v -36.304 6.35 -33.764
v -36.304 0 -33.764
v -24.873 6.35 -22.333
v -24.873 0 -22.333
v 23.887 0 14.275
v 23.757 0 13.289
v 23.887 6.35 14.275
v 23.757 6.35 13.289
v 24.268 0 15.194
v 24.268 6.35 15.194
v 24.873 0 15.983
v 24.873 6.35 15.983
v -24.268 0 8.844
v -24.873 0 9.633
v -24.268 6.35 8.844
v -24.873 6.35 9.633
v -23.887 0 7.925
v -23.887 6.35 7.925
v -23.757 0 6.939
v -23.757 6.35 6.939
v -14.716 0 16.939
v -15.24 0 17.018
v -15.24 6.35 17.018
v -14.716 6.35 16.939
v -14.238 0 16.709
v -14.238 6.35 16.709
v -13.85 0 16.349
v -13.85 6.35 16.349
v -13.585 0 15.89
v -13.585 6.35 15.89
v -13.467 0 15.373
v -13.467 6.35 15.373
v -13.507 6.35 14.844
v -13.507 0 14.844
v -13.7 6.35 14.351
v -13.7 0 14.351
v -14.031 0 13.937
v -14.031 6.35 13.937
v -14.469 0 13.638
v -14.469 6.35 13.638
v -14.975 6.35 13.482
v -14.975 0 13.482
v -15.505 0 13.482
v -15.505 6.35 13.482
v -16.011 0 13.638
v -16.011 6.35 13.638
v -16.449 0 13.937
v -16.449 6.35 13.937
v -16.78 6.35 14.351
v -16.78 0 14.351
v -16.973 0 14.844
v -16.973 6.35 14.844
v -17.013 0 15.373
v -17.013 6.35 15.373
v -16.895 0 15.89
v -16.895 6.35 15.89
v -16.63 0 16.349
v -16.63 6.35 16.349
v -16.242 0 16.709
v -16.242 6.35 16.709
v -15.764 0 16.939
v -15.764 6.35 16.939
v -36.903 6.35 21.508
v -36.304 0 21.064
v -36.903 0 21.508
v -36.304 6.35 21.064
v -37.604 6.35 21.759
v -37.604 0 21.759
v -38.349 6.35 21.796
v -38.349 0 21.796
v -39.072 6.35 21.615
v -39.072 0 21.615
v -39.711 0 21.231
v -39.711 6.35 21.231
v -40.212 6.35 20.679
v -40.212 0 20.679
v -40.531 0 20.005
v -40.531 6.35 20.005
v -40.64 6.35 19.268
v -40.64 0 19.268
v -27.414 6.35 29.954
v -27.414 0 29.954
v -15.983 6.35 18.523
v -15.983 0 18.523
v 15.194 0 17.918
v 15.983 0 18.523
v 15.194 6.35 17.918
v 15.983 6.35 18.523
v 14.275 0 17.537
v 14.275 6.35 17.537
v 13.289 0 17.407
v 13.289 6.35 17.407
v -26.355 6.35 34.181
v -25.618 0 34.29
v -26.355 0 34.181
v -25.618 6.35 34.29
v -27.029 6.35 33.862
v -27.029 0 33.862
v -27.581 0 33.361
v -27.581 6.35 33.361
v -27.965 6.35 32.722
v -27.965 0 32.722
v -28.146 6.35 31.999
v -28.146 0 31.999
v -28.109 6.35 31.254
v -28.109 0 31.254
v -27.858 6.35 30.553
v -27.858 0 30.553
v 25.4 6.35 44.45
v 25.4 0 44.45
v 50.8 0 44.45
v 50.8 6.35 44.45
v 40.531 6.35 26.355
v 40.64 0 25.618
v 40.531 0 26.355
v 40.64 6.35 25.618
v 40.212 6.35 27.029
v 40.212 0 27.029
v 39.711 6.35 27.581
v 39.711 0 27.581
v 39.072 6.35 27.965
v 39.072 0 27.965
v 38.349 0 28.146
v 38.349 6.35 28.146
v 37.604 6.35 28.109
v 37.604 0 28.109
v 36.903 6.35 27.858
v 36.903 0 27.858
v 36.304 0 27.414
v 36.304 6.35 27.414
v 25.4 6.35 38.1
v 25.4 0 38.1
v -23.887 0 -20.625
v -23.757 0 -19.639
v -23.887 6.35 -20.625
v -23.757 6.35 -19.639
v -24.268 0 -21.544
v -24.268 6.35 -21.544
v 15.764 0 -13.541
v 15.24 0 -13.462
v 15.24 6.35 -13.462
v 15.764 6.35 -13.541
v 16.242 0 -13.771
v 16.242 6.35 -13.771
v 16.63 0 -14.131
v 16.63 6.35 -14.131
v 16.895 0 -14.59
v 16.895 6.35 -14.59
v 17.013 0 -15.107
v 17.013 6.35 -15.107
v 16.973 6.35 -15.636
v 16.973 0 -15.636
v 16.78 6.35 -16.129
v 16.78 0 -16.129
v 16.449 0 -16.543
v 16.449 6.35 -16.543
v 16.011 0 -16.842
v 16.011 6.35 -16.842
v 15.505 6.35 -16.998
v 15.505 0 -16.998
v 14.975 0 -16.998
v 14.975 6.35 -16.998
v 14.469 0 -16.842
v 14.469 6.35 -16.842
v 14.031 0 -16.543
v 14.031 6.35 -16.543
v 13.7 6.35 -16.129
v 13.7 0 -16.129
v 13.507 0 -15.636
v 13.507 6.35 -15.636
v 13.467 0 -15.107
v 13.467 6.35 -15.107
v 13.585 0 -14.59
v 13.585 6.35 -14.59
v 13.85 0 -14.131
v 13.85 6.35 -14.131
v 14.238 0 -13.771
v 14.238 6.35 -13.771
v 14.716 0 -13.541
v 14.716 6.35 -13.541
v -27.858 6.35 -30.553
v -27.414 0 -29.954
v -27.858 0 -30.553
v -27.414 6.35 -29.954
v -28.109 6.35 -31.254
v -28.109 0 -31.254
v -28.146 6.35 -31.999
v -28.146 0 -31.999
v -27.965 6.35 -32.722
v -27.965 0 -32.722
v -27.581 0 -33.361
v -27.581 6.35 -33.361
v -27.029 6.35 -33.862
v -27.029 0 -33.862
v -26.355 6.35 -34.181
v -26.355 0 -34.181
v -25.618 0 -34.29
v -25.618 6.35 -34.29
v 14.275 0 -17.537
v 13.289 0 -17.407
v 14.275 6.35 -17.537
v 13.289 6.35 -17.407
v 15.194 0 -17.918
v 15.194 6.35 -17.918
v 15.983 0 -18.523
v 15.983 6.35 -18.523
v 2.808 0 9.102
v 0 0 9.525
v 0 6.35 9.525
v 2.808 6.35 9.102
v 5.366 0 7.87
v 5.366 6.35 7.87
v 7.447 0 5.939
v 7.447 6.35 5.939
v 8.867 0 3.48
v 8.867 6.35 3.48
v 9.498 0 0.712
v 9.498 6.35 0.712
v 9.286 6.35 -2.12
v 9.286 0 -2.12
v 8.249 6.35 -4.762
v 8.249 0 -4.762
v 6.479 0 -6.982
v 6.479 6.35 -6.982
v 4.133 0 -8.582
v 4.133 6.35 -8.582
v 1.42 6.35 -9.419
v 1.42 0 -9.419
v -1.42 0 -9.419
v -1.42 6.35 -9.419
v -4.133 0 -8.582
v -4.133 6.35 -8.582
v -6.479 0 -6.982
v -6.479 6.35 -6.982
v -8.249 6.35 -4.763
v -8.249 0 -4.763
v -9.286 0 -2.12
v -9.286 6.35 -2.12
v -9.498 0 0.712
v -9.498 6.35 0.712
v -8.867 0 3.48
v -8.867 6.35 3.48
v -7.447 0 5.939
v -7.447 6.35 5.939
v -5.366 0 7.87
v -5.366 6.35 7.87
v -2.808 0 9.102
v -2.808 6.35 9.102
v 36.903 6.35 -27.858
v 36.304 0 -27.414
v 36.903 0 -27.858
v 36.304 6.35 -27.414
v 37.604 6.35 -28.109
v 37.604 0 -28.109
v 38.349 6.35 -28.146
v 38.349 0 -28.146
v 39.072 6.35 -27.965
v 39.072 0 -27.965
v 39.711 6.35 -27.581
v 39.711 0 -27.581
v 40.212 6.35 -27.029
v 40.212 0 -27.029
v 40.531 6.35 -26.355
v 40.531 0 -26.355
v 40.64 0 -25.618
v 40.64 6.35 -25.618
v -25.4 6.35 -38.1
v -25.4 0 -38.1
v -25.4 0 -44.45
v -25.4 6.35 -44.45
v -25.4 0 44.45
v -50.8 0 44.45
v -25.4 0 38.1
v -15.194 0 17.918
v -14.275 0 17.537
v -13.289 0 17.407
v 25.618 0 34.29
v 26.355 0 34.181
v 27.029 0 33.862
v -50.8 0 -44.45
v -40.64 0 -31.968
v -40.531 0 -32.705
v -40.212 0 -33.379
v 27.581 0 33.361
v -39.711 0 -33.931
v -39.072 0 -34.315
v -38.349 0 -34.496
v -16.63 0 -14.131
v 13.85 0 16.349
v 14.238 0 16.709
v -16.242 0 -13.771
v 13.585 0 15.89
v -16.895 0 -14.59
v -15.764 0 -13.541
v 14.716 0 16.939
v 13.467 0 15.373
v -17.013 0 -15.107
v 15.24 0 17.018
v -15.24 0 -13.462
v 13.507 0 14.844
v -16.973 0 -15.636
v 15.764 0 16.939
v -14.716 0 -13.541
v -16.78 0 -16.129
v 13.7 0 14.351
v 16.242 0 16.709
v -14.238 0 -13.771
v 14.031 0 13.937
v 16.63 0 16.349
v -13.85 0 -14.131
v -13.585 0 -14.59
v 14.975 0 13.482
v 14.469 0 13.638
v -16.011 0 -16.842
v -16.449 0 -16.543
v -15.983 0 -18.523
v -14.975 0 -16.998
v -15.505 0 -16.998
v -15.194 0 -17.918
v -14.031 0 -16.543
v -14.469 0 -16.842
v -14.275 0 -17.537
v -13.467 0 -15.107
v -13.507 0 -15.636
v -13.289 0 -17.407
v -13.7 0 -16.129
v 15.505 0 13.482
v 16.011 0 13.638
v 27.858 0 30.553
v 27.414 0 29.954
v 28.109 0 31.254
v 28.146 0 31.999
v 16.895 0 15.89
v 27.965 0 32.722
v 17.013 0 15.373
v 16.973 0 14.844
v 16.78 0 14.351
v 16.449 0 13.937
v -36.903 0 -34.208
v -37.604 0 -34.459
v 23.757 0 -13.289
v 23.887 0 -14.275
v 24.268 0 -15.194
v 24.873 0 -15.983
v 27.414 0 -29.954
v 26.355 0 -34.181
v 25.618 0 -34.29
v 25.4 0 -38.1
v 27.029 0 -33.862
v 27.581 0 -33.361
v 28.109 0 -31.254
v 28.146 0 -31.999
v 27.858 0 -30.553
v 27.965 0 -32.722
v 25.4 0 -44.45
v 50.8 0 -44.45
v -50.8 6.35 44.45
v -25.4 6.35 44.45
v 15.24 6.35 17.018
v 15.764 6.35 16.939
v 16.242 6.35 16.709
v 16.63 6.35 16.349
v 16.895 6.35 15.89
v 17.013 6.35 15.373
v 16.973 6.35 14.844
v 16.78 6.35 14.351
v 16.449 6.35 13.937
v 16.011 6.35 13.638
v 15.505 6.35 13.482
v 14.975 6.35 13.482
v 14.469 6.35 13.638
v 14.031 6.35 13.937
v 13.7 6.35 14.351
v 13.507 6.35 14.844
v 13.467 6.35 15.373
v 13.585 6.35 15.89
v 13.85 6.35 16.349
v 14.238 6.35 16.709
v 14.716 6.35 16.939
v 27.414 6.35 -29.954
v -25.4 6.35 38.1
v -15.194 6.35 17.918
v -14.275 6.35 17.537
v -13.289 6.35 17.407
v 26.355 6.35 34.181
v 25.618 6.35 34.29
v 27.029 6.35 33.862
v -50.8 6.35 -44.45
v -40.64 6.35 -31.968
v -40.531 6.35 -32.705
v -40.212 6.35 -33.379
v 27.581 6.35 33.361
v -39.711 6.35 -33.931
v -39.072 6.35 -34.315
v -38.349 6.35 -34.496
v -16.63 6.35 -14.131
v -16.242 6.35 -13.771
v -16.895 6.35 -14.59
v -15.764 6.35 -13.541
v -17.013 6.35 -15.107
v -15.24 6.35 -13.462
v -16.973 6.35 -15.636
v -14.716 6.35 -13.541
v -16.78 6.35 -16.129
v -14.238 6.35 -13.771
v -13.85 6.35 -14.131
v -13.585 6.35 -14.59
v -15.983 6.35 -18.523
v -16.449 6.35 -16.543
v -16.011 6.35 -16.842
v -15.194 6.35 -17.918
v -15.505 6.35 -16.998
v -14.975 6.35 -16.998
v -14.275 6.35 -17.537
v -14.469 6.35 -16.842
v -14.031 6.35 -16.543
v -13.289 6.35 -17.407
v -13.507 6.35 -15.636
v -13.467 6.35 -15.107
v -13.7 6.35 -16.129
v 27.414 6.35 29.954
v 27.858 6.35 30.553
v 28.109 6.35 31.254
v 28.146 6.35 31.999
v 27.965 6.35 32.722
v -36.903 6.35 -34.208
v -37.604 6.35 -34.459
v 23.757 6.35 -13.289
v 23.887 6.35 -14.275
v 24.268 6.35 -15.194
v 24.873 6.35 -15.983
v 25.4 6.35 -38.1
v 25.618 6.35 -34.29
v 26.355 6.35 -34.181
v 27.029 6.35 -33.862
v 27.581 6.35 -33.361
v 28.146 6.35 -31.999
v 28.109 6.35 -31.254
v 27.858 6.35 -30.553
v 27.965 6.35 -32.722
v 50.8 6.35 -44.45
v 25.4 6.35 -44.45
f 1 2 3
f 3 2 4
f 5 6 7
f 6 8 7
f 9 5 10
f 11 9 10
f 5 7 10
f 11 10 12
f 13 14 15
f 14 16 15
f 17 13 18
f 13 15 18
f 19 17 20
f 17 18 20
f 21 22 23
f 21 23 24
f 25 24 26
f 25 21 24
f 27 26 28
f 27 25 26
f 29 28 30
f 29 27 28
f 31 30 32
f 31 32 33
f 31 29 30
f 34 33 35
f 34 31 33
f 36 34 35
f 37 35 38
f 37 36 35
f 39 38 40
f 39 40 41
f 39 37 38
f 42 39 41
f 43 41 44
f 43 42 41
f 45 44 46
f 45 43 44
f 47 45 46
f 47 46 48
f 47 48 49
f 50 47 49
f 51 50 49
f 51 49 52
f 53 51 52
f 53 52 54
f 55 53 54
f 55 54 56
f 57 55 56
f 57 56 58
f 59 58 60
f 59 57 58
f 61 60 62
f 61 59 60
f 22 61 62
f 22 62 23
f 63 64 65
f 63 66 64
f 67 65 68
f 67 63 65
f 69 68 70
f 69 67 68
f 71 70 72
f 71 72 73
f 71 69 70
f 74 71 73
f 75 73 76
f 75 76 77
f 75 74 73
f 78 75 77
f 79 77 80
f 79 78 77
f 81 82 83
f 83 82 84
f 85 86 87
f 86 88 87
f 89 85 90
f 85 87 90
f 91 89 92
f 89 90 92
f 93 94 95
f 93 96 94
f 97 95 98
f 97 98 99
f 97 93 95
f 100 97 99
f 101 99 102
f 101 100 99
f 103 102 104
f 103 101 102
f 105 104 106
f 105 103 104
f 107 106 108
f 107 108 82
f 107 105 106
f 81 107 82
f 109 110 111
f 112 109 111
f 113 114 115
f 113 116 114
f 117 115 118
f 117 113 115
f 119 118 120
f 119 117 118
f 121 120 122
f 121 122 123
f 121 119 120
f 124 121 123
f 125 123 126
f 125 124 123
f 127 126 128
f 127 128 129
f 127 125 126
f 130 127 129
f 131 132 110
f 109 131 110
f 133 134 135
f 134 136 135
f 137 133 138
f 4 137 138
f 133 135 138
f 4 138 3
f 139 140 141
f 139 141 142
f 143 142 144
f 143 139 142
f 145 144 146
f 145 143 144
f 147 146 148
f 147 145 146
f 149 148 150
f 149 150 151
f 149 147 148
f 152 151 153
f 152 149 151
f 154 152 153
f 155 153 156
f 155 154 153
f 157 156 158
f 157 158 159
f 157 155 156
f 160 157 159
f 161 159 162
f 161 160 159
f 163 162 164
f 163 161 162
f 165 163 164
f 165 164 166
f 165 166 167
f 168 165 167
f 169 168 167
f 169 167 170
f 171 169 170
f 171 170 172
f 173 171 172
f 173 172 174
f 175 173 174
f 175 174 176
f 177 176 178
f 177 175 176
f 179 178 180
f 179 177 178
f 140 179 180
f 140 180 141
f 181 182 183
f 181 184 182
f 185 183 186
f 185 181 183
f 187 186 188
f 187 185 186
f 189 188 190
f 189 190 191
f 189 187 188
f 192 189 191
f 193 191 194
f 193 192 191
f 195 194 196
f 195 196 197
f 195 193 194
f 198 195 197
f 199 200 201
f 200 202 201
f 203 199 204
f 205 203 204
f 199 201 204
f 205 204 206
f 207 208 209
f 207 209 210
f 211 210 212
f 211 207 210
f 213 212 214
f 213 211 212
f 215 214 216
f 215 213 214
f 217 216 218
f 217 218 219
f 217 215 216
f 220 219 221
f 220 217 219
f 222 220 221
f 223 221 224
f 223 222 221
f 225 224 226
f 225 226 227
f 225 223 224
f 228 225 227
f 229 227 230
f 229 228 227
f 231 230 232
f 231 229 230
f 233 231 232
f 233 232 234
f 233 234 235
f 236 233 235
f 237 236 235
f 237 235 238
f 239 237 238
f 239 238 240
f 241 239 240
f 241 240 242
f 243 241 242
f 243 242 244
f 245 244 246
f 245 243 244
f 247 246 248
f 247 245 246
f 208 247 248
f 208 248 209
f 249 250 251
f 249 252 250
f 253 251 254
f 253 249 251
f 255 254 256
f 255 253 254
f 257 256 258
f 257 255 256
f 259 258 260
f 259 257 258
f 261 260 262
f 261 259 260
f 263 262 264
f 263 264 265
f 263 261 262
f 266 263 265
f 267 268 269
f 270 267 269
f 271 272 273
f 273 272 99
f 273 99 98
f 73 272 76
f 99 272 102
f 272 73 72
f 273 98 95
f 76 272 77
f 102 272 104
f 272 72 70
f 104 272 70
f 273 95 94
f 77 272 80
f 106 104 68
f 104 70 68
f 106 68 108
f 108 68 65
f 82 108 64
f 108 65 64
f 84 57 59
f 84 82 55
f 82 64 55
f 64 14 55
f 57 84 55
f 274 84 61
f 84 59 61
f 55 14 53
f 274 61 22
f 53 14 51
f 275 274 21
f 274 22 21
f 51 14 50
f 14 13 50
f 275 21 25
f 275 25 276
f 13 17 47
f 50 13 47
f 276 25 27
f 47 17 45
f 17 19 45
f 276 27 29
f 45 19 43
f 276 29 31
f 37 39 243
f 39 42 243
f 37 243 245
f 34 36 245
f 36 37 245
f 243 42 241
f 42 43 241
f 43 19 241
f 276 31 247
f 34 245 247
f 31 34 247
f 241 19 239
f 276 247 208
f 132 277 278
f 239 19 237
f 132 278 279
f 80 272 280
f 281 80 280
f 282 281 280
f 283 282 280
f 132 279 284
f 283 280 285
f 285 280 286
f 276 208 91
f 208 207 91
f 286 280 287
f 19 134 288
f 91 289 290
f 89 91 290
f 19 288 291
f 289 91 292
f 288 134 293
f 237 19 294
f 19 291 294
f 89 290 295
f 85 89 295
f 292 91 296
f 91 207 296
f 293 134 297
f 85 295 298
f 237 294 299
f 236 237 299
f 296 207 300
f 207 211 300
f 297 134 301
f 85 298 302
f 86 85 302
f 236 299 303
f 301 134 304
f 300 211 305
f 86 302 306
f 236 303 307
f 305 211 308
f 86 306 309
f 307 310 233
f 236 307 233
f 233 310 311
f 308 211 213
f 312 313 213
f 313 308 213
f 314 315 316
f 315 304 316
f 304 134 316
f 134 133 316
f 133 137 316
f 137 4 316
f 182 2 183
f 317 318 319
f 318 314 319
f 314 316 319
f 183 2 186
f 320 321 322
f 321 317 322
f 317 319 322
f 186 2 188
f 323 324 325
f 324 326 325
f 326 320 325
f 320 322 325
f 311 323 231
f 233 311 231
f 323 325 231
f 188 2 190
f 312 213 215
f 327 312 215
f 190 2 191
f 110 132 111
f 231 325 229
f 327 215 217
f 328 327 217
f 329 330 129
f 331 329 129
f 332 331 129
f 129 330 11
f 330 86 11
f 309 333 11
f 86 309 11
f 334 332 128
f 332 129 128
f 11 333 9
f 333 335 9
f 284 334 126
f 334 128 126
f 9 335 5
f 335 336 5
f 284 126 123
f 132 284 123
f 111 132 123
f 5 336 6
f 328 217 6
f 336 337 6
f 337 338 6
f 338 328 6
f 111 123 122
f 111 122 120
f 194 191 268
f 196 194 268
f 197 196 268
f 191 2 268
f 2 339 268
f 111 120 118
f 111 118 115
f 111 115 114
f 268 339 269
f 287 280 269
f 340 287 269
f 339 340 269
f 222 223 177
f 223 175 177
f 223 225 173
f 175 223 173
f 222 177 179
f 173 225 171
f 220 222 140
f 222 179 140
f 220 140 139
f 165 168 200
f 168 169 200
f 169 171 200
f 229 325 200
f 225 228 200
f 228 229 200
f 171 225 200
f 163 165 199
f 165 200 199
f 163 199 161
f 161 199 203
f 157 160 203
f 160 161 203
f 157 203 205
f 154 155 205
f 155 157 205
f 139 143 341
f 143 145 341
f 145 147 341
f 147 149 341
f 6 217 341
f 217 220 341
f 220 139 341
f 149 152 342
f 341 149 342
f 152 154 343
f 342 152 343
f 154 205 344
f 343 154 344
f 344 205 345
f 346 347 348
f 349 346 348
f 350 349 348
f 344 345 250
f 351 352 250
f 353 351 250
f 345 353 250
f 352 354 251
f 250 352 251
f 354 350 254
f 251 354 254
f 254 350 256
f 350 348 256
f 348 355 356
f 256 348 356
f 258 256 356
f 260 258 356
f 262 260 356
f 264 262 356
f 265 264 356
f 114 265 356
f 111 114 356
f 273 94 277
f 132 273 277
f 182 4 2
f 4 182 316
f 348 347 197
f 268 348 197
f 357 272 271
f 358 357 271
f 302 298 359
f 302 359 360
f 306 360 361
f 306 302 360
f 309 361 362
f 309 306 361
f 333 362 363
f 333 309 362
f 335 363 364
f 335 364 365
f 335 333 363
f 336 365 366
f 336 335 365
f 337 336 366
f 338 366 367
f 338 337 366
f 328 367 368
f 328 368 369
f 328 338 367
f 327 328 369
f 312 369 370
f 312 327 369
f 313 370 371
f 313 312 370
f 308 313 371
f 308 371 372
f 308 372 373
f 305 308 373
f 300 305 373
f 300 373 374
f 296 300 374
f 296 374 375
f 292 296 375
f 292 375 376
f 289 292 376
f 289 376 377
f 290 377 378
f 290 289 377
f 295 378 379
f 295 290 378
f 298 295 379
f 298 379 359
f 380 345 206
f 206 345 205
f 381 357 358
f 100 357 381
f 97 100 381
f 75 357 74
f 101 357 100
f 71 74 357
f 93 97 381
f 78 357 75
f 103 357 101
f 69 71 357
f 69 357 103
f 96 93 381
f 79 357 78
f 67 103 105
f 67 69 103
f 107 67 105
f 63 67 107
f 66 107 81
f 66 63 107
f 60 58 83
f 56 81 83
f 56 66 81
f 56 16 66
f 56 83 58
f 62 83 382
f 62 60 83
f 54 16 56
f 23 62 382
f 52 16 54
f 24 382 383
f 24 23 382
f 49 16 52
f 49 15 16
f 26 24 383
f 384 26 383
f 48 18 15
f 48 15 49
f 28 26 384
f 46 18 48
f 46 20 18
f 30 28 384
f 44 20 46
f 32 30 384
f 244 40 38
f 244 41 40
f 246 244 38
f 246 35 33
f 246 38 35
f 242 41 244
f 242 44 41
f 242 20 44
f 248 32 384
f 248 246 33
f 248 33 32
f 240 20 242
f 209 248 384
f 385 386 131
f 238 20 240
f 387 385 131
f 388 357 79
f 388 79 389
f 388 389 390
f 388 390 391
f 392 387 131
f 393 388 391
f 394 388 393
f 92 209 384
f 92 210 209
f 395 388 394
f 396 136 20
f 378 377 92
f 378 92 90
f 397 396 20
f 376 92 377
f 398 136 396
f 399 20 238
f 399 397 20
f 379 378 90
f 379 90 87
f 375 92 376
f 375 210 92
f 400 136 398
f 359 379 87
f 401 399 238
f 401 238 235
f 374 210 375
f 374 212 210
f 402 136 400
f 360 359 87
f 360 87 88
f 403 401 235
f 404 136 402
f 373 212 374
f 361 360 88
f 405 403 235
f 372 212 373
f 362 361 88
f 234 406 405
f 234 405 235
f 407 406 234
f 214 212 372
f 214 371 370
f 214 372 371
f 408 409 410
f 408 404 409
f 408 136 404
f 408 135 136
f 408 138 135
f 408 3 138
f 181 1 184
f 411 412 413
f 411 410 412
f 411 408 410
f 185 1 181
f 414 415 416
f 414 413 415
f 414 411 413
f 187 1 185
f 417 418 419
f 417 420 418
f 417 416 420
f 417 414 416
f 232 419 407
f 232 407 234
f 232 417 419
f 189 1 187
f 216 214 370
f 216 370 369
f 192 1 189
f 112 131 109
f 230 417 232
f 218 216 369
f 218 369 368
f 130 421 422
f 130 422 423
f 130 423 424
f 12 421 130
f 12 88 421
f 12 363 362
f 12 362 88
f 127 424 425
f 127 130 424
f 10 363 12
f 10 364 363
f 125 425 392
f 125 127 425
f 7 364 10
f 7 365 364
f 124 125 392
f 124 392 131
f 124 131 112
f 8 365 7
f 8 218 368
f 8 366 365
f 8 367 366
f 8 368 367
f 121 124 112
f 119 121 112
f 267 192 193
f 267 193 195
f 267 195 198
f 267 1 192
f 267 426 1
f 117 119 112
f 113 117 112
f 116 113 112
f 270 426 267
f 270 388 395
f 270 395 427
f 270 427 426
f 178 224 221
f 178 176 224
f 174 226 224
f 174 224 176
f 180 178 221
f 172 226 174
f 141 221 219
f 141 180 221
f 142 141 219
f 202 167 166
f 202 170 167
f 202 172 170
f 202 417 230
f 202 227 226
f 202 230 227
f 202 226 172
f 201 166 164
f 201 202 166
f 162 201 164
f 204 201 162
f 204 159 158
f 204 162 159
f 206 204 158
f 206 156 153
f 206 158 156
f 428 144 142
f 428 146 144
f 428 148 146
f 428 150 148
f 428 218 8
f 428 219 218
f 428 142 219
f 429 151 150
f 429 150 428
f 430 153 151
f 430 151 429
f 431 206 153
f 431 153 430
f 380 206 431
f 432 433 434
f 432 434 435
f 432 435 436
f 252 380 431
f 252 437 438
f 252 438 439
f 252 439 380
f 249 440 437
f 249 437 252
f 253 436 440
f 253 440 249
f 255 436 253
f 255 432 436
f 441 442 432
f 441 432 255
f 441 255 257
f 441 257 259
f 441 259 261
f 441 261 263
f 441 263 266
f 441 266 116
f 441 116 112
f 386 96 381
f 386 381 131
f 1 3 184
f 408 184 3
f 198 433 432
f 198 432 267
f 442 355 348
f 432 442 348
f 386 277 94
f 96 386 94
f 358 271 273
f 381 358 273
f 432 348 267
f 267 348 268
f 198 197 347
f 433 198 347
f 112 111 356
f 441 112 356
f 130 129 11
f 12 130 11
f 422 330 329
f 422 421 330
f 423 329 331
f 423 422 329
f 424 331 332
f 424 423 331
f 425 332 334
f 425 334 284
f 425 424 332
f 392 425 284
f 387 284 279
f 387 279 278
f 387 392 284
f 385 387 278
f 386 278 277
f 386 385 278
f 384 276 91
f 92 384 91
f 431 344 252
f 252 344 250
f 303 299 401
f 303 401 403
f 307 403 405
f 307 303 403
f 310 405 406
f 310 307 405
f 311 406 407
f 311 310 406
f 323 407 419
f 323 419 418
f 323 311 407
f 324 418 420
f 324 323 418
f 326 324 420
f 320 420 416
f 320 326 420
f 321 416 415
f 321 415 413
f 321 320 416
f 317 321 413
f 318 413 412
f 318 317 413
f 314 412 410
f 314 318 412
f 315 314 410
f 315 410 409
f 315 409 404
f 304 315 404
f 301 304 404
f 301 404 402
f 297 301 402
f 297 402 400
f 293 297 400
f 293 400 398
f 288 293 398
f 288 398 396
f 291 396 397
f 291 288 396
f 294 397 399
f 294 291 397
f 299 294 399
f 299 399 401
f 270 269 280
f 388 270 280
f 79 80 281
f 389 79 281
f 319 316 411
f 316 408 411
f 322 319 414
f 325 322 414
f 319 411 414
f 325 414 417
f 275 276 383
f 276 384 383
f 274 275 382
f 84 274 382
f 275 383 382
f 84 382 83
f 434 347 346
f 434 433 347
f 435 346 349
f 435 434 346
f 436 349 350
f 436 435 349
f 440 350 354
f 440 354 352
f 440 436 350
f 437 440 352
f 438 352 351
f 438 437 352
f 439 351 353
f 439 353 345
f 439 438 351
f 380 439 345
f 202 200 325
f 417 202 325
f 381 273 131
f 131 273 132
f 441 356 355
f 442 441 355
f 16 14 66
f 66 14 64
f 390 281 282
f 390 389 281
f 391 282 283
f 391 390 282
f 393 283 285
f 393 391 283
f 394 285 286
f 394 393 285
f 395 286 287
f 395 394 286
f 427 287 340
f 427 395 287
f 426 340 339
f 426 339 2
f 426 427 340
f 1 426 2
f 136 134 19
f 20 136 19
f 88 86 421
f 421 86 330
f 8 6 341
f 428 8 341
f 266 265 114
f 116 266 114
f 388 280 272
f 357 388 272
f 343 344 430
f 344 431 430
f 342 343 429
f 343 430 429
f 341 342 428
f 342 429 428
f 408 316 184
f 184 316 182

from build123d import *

# Parameters (mm, degrees)
SKETCH1_R           = 1.778
SKETCH1_R_2         = 9.525
BOSS_EXTRUDE1_DEPTH = 6.35
FILLET1_R           = 3.81
FILLET2_R           = 2.54


with BuildPart() as part:
    # Sketch1 → Boss-Extrude1 (new body)
    with BuildSketch(Plane(origin=(0, 0, 0), x_dir=(1, 0, 0), z_dir=(0, 1, 0))):
        Polygon((-25.4, 38.1), (-25.4, 44.45), (-50.8, 44.45), (-50.8, -44.45), (-25.4, -44.45), (-25.4, -38.1), (0, -38.1), (25.4, -38.1), (25.4, -44.45), (50.8, -44.45), (50.8, 0), (50.8, 44.45), (25.4, 44.45), (25.4, 38.1), align=None)
        Polygon((31.75, -34.29), (0, -34.29), (-31.75, -34.29), (-14.867118492, -17.407118492), (14.867118492, -17.407118492), align=None, mode=Mode.SUBTRACT)
        with Locations(Location((-15.24, -15.24, 0), (0, 0, 270))):
            Circle(SKETCH1_R, mode=Mode.SUBTRACT)
        with Locations(Location((15.24, -15.24, 0), (0, 0, 270))):
            Circle(SKETCH1_R, mode=Mode.SUBTRACT)
        with Locations(Location((-15.24, 15.24, 0), (0, 0, 270))):
            Circle(SKETCH1_R, mode=Mode.SUBTRACT)
        with Locations(Location((15.24, 15.24, 0), (0, 0, 270))):
            Circle(SKETCH1_R, mode=Mode.SUBTRACT)
        Polygon((40.64, 31.75), (40.64, 0), (40.64, -31.75), (23.757118492, -14.867118492), (23.757118492, 0), (23.757118492, 14.867118492), align=None, mode=Mode.SUBTRACT)
        Polygon((-40.64, -25.4), (-40.64, 38.1), (-23.757118492, 21.217118492), (-23.757118492, -8.517118492), align=None, mode=Mode.SUBTRACT)
        Polygon((-31.75, 34.29), (31.75, 34.29), (14.867118492, 17.407118492), (-14.867118492, 17.407118492), align=None, mode=Mode.SUBTRACT)
        with Locations(Location((0, 0, 0), (0, 0, 270))):
            Circle(SKETCH1_R_2, mode=Mode.SUBTRACT)
    extrude(amount=BOSS_EXTRUDE1_DEPTH)

    # Fillet1
    fillet1_edges = [part.edges().sort_by_distance(p)[0] for p in [
        (14.867118492, 3.175, -17.407118492),
        (-14.867118492, 3.175, -17.407118492),
        (14.867118492, 3.175, 17.407118492),
        (-14.867118492, 3.175, 17.407118492),
        (23.757118492, 3.175, -14.867118492),
        (23.757118492, 3.175, 14.867118492),
        (-23.757118492, 3.175, 8.517118492),
        (-23.757118492, 3.175, -21.217118492),
    ]]
    fillet(fillet1_edges, radius=FILLET1_R)

    # Fillet2
    fillet2_edges = [part.edges().sort_by_distance(p)[0] for p in [
        (31.75, 3.175, -34.29),
        (-31.75, 3.175, -34.29),
        (-31.75, 3.175, 34.29),
        (31.75, 3.175, 34.29),
        (40.64, 3.175, -31.75),
        (40.64, 3.175, 31.75),
        (-40.64, 3.175, 25.4),
        (-40.64, 3.175, -38.1),
    ]]
    fillet(fillet2_edges, radius=FILLET2_R)


solid = part.part
